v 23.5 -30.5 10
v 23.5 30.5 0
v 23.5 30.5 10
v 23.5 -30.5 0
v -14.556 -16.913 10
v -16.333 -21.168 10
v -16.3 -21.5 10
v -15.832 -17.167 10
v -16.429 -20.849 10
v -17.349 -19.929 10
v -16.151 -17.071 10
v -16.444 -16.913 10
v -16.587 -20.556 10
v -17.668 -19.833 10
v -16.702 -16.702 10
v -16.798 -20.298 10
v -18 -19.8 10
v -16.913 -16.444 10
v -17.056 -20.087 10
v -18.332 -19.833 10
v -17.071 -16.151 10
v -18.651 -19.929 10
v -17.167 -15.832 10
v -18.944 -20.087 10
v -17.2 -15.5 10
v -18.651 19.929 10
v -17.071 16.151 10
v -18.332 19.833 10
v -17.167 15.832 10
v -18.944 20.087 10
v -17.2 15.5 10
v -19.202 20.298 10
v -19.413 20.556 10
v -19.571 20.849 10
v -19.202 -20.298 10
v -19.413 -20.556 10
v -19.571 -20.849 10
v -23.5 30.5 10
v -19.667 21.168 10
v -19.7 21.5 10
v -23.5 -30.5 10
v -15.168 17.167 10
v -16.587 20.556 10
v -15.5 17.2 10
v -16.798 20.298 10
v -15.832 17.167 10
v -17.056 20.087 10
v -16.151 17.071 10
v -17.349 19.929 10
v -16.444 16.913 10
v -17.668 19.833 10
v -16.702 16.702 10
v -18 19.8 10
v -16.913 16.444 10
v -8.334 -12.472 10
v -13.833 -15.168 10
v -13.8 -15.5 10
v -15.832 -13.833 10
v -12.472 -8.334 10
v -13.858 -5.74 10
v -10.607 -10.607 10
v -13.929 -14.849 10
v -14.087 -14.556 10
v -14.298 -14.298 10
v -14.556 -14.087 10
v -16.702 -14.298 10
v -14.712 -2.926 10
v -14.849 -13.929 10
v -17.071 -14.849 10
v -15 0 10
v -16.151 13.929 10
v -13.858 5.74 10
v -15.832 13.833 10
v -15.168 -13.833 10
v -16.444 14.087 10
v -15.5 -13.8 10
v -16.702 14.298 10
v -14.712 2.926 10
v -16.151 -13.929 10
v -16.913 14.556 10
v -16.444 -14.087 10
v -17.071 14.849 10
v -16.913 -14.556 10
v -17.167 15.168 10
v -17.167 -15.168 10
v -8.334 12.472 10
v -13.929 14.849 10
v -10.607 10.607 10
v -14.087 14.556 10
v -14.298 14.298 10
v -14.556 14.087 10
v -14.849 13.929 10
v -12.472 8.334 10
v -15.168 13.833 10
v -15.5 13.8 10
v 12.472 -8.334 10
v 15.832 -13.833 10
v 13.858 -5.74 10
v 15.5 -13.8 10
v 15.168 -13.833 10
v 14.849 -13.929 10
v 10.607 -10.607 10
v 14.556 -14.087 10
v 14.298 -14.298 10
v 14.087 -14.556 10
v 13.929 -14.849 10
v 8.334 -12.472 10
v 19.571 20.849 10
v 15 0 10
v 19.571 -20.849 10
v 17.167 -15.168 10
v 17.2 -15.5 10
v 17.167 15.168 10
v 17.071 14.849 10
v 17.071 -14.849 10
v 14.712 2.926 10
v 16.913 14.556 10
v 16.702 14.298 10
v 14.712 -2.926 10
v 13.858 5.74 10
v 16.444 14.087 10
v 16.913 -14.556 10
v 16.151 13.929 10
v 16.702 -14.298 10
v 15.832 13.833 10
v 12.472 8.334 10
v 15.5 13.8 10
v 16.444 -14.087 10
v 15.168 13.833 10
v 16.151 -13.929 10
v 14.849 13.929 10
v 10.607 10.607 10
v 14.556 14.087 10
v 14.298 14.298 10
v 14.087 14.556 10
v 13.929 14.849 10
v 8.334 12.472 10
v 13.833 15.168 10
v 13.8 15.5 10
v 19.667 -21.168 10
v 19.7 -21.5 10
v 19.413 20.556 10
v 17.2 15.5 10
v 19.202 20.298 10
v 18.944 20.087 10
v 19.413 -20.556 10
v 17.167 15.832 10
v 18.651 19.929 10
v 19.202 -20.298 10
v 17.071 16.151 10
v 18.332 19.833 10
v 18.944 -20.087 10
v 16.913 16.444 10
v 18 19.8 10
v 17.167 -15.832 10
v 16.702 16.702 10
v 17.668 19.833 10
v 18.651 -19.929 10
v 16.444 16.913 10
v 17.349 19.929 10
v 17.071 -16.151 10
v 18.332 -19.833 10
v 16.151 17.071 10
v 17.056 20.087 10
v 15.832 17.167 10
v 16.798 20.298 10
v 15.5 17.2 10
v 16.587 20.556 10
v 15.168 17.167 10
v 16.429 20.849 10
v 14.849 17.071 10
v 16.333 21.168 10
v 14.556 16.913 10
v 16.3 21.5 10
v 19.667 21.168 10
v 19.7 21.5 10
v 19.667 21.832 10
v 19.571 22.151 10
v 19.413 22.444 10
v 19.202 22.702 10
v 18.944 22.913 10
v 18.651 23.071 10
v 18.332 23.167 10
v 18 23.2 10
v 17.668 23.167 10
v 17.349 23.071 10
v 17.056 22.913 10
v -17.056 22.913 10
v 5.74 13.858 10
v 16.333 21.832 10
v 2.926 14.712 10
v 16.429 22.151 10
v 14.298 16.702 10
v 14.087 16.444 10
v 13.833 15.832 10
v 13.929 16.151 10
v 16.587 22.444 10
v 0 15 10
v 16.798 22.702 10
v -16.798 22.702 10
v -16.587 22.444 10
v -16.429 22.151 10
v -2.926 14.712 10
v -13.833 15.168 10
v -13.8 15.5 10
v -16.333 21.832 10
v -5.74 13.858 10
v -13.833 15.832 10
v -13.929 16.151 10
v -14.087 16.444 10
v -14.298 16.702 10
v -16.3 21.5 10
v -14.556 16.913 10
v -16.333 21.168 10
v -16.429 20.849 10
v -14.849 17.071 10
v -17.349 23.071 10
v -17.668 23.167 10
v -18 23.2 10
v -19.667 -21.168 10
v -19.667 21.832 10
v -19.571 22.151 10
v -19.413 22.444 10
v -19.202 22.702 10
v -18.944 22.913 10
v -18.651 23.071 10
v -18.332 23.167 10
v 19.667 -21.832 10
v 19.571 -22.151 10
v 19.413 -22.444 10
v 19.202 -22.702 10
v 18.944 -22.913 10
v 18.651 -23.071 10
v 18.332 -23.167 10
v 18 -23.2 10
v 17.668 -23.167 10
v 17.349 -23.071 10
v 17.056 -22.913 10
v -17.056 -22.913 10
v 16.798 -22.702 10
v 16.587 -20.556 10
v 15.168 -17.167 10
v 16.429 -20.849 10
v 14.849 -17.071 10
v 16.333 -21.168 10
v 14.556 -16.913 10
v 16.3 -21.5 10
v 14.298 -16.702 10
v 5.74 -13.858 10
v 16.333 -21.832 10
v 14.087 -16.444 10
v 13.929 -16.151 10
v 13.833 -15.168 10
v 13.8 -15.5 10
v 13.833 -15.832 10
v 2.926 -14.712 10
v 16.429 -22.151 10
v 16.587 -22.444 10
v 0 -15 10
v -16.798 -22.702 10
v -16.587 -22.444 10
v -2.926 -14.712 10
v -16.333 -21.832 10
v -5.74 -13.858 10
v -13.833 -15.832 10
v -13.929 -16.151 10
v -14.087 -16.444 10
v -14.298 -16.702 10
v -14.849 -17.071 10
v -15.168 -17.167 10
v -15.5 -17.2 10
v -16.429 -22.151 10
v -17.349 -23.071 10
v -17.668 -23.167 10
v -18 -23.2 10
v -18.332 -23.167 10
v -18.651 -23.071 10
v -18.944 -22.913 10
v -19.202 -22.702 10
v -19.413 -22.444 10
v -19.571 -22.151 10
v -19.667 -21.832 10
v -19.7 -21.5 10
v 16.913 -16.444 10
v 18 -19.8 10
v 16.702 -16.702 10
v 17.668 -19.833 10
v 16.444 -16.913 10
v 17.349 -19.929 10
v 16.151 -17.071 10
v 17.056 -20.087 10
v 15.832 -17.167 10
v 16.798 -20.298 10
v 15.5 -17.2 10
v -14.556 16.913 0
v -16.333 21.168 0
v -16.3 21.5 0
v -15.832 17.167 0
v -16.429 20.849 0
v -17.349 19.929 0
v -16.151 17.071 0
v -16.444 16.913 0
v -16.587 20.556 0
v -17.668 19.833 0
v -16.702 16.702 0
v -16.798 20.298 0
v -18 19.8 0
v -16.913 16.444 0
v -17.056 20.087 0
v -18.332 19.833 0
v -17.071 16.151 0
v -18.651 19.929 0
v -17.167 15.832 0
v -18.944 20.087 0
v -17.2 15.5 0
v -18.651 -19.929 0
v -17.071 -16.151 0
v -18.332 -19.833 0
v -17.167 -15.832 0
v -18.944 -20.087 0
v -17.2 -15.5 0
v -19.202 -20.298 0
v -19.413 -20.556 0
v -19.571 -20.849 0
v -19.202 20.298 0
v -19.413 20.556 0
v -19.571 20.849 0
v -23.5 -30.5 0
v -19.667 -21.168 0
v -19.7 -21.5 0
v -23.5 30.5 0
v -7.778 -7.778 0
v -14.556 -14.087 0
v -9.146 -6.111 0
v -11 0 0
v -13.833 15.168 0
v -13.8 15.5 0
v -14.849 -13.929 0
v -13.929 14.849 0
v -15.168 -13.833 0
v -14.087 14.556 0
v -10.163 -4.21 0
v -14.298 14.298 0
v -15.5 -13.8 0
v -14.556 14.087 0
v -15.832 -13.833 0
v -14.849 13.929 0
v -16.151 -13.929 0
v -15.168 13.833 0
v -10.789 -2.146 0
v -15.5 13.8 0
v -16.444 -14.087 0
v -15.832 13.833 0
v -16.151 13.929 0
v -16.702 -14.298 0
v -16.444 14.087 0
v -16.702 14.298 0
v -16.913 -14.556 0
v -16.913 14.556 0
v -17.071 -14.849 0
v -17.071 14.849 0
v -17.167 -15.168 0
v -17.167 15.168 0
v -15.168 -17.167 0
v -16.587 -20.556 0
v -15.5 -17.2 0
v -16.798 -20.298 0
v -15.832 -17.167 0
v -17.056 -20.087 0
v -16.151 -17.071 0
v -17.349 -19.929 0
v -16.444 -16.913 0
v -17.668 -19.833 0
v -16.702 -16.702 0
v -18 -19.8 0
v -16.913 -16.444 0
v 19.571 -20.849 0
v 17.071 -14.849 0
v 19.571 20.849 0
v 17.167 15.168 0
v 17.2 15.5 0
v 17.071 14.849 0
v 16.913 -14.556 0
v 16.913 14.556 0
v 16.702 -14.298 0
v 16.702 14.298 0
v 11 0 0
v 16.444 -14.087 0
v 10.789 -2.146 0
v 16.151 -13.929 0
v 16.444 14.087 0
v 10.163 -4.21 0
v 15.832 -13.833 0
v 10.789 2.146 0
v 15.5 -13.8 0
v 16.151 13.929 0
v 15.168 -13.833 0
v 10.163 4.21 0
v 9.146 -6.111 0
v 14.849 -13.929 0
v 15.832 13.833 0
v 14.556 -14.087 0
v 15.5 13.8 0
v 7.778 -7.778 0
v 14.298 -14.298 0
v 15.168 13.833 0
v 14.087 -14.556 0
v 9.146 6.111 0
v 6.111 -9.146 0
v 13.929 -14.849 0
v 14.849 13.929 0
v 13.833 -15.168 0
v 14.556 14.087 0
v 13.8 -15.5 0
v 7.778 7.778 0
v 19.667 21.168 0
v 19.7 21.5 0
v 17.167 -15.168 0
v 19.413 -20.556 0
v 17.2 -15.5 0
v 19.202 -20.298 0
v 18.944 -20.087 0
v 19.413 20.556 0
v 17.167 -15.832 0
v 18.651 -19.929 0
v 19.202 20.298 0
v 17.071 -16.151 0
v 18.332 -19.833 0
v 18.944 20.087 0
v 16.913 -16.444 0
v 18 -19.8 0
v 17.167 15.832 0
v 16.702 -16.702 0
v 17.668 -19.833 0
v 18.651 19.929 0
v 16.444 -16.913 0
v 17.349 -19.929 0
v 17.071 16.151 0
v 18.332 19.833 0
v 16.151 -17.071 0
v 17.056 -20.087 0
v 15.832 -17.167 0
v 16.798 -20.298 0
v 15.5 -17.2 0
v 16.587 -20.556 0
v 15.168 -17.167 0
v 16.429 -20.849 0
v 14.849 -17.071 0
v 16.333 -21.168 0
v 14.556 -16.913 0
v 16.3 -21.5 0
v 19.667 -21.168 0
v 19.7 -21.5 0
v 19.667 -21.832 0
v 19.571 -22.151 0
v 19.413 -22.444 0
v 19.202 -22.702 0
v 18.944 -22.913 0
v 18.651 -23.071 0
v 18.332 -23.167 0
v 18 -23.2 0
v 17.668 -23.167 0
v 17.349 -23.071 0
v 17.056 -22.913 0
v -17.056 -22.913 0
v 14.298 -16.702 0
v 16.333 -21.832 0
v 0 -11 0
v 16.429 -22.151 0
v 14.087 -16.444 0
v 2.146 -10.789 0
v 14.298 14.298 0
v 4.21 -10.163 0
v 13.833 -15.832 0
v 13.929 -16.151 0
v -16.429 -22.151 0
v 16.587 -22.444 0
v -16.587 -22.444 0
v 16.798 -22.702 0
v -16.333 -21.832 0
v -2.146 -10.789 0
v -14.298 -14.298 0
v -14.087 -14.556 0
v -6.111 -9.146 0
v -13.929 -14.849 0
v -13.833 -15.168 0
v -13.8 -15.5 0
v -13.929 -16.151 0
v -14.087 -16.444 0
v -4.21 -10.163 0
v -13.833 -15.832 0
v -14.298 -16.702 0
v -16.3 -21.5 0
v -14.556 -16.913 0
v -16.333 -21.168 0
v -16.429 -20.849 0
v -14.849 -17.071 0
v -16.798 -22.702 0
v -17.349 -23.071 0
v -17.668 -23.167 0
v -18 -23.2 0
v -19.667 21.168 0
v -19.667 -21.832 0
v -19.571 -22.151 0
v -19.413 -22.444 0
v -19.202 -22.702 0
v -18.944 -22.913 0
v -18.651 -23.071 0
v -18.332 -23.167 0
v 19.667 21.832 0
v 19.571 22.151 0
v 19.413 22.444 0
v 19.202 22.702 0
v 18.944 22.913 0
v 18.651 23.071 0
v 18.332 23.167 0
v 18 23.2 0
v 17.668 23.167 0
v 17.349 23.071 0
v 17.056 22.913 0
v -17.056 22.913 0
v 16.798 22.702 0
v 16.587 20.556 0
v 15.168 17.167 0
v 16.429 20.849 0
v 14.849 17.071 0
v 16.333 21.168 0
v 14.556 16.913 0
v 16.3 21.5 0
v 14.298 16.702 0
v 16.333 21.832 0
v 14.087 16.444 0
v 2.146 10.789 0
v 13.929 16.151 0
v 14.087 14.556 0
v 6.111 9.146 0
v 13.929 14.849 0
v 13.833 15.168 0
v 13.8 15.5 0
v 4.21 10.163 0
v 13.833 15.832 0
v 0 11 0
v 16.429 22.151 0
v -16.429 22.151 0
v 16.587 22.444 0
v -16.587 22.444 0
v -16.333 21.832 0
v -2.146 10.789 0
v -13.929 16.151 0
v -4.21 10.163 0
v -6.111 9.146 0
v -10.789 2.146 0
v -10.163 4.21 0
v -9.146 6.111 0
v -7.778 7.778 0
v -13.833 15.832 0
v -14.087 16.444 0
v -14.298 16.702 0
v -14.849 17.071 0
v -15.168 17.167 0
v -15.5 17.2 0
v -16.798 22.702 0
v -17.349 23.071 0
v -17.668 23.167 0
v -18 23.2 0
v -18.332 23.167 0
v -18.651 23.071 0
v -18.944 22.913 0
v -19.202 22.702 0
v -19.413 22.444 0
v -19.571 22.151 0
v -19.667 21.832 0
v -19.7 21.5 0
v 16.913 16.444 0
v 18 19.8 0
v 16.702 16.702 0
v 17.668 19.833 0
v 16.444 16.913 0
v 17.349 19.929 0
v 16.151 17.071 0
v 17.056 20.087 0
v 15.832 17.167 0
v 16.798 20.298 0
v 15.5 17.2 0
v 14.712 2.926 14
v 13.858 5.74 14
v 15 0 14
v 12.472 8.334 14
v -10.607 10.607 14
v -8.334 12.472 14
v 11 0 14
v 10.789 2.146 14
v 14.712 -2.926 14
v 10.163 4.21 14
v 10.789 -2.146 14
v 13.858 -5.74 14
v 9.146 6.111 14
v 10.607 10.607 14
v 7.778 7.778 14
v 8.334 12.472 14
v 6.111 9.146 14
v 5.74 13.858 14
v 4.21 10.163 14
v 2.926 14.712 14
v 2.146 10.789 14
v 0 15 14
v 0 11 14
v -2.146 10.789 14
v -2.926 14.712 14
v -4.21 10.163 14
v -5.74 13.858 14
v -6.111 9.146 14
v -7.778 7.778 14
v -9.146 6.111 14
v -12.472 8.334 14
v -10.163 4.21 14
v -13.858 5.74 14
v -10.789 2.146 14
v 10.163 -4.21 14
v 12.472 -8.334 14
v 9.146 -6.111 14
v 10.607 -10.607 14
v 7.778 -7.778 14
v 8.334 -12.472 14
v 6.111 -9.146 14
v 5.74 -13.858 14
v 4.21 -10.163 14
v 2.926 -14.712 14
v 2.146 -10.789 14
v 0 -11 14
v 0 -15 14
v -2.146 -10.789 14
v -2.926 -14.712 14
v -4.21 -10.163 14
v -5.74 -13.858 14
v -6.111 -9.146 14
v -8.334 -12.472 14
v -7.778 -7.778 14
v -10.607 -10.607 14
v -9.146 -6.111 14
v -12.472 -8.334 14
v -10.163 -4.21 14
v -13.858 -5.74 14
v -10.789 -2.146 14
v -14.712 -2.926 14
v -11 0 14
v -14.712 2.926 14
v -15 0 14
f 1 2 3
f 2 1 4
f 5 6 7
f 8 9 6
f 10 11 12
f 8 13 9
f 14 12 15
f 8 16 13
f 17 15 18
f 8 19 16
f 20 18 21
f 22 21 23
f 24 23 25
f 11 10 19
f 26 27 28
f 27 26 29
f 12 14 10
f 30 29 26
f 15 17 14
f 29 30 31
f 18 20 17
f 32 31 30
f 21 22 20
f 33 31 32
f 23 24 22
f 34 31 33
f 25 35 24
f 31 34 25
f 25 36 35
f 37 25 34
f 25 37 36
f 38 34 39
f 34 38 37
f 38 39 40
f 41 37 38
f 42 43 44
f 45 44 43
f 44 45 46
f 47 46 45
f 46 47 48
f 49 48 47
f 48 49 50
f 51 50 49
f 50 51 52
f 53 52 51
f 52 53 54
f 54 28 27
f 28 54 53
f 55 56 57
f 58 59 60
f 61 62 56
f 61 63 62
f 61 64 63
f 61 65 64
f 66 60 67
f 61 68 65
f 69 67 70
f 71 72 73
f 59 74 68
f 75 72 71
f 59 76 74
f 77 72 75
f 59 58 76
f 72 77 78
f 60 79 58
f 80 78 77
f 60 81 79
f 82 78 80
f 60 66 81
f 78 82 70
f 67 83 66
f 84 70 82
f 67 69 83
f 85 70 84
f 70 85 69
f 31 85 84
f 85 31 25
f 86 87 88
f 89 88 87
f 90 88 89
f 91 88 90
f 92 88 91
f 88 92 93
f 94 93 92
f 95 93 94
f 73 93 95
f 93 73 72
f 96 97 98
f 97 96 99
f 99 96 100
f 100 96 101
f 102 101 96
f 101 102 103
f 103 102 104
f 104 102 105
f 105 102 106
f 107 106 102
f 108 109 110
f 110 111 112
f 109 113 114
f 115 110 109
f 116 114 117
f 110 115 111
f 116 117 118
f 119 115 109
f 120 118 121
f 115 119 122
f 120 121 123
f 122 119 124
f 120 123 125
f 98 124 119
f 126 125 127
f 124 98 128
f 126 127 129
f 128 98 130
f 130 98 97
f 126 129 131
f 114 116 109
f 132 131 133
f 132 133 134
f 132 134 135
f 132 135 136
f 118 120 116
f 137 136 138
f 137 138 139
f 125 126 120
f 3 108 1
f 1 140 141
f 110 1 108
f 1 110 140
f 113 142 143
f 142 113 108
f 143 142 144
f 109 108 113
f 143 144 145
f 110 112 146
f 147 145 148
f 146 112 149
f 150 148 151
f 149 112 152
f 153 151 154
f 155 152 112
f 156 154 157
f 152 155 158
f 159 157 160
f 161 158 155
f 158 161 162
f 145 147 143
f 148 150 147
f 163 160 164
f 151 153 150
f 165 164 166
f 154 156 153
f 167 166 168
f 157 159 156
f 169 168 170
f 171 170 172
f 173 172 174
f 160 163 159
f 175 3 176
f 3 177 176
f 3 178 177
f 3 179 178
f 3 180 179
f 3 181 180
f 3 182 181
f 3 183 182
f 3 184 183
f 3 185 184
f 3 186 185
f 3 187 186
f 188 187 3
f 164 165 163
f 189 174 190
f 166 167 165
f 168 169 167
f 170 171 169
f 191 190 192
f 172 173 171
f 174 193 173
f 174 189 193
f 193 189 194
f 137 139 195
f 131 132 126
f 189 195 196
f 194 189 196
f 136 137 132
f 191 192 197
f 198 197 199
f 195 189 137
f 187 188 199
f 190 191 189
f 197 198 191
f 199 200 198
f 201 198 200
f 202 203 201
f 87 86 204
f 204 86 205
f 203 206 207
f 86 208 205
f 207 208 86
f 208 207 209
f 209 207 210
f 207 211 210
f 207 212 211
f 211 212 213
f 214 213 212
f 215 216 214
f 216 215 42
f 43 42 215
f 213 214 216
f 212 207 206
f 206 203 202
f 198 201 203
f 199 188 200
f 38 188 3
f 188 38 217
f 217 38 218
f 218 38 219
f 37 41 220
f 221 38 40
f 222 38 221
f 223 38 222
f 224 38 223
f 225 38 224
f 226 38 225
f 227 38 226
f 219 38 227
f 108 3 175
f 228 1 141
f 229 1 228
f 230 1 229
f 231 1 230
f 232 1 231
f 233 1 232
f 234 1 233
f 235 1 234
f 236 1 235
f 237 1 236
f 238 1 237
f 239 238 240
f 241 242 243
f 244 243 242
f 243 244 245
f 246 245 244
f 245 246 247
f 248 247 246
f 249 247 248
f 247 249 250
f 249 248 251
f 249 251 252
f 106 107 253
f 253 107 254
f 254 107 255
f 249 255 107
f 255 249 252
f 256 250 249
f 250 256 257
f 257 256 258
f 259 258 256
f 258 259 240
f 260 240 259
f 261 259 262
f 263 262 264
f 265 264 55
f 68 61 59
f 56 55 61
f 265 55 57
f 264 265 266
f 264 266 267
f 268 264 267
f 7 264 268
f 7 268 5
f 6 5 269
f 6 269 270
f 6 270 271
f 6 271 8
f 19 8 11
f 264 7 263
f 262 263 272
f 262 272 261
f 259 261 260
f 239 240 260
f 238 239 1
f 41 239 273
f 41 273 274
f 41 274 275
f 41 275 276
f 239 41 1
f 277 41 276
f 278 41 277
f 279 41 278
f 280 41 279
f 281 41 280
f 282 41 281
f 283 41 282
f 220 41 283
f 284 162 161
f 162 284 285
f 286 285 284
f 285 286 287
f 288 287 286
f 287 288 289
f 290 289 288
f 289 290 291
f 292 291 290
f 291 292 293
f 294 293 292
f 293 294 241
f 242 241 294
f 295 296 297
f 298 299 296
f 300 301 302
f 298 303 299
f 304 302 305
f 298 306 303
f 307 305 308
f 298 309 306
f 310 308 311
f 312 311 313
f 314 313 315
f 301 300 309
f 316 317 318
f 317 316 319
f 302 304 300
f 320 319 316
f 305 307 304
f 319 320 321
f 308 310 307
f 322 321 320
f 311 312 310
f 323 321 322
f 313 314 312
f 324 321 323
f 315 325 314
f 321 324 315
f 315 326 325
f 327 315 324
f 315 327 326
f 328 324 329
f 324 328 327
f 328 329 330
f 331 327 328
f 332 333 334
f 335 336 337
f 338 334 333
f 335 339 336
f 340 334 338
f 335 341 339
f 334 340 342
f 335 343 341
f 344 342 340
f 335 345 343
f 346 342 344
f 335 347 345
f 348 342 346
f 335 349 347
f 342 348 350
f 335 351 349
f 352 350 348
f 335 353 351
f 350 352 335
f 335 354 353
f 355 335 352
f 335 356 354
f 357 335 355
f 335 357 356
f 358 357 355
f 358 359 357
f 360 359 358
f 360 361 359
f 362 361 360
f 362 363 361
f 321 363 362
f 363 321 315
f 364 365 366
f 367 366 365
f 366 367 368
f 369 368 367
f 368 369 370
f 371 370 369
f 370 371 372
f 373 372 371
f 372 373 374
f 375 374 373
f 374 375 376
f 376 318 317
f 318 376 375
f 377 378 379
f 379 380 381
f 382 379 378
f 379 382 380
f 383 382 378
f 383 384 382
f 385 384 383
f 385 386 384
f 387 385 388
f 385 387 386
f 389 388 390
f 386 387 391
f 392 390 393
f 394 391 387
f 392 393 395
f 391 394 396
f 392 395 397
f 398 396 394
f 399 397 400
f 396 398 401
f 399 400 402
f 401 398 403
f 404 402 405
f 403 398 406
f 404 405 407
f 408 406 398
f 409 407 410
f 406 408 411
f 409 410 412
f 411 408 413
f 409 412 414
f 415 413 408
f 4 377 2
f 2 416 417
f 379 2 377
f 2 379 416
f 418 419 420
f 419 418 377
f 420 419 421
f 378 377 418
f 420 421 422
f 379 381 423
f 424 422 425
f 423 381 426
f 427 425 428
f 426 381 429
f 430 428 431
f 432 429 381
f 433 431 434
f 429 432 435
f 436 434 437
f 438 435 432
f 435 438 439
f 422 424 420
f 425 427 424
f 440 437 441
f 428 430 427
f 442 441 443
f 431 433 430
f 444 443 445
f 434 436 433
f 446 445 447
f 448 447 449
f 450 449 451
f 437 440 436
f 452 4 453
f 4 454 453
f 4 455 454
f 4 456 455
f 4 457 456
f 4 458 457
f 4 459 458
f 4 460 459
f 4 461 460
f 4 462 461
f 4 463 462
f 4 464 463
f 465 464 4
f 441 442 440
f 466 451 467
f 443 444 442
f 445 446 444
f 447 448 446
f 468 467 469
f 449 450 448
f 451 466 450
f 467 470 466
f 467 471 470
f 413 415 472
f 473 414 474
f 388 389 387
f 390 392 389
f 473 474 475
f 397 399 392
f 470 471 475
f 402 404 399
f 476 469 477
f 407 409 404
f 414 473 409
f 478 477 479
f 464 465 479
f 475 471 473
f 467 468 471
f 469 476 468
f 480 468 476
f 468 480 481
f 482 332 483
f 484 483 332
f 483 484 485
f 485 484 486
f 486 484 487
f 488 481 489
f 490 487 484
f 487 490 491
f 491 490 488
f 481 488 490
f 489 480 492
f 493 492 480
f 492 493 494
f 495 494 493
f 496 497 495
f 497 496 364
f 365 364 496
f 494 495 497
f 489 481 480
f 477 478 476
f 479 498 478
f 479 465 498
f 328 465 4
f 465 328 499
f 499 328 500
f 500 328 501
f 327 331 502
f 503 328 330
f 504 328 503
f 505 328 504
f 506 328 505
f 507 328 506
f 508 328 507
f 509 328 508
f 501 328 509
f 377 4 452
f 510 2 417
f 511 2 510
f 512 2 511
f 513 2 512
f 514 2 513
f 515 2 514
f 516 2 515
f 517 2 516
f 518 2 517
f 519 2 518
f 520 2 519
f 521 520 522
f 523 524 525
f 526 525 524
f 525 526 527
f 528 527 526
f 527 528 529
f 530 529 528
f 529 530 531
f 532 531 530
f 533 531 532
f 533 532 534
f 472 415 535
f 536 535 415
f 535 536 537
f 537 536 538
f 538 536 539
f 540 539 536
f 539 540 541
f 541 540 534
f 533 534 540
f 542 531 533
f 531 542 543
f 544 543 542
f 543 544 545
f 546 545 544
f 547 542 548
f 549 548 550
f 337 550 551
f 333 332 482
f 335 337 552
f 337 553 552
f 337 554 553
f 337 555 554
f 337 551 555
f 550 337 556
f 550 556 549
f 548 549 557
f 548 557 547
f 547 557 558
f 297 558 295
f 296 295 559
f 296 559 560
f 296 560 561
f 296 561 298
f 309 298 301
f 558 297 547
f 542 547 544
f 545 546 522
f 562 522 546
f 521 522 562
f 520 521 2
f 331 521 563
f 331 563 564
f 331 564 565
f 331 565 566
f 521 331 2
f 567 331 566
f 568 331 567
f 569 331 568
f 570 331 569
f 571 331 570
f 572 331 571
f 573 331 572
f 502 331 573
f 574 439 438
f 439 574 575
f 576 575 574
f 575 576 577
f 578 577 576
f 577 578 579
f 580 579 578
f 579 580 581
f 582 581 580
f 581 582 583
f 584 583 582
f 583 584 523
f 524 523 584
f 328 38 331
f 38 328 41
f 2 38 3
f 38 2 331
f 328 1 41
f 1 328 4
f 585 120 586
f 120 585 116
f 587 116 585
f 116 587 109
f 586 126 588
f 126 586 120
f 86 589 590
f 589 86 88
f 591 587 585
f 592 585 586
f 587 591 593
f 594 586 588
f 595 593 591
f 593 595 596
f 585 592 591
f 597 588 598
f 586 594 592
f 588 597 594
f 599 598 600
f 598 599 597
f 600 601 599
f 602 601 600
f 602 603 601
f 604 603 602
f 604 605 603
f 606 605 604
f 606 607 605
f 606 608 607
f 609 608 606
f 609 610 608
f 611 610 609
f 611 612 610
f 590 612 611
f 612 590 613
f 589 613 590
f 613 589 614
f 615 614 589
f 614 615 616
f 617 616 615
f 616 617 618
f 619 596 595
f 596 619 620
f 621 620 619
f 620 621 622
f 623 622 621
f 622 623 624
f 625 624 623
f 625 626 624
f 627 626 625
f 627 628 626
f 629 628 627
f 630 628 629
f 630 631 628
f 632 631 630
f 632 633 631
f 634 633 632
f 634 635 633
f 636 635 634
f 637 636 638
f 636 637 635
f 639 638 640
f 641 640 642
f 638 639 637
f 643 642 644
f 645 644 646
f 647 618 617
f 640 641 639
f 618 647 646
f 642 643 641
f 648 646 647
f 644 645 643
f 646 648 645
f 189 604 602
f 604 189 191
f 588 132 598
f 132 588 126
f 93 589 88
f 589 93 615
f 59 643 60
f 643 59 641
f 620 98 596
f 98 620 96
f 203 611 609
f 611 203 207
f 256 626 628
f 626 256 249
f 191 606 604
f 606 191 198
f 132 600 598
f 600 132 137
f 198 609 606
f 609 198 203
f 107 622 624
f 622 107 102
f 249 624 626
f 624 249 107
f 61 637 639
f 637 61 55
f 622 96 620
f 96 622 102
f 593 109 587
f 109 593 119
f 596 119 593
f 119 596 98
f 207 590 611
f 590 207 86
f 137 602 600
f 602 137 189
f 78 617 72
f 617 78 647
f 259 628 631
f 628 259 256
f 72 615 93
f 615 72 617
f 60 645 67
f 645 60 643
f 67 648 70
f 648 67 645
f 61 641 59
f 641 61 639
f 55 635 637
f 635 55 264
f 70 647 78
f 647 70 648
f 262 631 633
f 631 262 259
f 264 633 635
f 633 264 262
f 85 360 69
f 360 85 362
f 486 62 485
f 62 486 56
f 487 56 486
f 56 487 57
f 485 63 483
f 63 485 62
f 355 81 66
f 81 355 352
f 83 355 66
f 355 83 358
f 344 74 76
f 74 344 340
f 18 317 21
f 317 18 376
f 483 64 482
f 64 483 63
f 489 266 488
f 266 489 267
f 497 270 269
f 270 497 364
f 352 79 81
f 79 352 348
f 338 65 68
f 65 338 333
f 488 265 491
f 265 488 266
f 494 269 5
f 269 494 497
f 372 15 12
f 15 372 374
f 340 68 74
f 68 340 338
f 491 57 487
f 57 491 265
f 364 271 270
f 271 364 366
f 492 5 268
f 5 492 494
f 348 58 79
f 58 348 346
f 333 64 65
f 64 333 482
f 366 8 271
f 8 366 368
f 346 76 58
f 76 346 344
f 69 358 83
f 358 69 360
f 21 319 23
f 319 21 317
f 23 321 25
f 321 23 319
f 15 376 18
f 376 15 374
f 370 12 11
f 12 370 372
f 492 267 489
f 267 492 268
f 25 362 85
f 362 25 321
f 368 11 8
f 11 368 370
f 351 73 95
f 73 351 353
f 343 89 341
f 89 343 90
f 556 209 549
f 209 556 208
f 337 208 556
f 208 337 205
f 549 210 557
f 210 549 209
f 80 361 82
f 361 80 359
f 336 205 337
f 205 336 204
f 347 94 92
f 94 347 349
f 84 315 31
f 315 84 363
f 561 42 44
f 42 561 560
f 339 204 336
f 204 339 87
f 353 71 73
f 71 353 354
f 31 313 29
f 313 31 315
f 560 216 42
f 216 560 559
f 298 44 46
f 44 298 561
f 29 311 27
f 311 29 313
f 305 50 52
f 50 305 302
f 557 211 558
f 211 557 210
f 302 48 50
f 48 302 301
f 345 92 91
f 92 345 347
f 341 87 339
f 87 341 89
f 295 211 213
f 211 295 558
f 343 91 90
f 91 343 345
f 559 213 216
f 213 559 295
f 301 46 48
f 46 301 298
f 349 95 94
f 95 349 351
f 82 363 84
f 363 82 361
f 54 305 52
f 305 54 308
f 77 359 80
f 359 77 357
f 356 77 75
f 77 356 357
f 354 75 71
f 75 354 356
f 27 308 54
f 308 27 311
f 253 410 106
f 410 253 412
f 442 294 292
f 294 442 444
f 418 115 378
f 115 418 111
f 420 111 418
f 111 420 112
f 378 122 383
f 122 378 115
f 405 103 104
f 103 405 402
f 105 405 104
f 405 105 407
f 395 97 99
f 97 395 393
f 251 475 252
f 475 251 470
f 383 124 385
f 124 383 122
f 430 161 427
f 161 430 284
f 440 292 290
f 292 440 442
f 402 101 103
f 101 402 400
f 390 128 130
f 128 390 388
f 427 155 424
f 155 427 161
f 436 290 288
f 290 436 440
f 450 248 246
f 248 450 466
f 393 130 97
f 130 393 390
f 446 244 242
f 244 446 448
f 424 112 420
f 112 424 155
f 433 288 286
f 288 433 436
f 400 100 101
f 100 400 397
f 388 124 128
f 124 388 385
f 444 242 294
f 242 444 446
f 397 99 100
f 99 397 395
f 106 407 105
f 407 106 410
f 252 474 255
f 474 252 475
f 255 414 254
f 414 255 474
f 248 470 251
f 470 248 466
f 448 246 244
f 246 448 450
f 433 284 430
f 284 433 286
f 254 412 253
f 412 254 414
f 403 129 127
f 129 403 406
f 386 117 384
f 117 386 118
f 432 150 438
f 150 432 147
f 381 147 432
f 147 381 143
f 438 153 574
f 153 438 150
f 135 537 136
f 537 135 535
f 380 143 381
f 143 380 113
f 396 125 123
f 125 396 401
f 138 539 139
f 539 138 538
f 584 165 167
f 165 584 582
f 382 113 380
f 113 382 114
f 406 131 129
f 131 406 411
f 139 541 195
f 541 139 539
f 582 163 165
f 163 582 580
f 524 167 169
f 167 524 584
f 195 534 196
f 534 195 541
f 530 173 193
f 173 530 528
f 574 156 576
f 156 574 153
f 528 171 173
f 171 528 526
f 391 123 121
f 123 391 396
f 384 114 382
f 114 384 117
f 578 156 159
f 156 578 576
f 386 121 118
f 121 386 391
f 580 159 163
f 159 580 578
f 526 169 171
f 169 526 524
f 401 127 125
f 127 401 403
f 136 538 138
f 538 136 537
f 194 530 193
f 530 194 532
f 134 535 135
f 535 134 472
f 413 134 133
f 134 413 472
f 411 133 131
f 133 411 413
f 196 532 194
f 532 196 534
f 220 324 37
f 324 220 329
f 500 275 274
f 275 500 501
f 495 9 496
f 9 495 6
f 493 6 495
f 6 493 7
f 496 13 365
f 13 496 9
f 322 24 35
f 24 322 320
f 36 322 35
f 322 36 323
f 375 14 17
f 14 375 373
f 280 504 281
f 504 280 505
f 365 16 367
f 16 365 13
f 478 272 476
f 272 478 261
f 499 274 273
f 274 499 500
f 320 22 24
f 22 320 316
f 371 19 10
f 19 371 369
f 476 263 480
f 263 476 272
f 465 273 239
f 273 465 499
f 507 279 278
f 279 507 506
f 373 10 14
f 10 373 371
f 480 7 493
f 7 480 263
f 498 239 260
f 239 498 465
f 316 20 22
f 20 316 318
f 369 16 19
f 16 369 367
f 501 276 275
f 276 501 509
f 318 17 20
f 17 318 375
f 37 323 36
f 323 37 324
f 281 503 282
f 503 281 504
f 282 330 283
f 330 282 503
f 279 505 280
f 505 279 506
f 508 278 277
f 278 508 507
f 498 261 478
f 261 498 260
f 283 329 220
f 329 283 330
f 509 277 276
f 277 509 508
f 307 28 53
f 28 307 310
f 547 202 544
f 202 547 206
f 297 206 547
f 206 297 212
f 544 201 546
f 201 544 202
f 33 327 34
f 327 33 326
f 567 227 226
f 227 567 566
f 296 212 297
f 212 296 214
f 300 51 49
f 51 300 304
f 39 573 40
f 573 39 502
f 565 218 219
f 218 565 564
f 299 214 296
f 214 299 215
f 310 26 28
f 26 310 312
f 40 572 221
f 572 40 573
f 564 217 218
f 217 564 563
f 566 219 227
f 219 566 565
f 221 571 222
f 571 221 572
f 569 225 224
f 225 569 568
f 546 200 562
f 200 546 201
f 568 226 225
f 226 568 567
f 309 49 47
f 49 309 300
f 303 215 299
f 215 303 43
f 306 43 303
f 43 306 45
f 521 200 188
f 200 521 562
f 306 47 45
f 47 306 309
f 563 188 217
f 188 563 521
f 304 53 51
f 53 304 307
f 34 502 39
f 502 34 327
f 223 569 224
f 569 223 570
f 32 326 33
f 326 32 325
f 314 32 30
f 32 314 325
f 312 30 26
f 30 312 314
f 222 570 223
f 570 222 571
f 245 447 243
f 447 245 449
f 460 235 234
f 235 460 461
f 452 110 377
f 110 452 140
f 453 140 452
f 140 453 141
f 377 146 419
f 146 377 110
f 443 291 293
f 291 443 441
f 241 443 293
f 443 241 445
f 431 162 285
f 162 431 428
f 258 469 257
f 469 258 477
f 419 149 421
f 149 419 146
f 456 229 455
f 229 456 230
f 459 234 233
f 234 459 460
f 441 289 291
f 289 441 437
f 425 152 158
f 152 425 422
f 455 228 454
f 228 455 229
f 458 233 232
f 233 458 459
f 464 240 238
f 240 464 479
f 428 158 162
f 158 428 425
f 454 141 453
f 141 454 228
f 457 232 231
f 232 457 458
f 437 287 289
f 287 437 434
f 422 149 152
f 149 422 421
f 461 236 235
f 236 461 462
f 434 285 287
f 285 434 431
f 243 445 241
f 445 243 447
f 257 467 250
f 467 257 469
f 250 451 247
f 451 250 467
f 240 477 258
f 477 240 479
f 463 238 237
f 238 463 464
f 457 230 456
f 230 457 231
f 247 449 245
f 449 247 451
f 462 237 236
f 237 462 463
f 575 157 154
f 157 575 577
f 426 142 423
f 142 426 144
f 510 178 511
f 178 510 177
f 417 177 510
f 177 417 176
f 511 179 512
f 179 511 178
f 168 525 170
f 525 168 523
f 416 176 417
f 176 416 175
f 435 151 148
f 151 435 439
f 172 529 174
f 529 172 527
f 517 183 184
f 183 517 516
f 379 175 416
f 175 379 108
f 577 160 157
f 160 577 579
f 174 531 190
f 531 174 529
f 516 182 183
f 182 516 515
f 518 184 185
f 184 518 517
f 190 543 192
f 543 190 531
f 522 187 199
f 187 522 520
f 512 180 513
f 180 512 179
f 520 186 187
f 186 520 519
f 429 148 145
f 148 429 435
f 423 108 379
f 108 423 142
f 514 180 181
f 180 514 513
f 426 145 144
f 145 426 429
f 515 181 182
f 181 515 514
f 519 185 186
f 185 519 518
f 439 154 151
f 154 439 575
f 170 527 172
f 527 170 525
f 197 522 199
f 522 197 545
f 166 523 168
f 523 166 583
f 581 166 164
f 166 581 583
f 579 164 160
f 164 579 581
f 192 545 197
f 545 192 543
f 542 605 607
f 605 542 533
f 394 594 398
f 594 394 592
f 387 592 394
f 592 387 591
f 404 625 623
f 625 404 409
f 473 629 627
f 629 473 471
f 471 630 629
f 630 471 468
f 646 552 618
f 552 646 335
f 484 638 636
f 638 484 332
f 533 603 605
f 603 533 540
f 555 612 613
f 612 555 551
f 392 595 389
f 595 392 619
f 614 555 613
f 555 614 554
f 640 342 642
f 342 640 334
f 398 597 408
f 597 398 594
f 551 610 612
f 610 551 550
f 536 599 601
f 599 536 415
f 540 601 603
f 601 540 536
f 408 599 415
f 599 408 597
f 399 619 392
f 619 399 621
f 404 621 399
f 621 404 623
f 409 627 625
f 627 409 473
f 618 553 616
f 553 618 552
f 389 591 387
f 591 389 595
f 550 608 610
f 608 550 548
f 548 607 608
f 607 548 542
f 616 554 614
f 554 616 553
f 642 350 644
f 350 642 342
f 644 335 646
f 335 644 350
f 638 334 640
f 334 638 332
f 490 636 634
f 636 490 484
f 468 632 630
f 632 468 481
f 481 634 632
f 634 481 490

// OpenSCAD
$fn = 32;

// ----------------------------------------------------------------------
// Motor mount plate: NEMA17, 47 x 61 x 14 mm
// ----------------------------------------------------------------------

// --- parameters (mm) ---
mount_w = 47;             // plate length, X
mount_d = 61;             // plate width, Y
mat_t = 10;               // plate thickness
motor_pitch = 31;         // NEMA17 bolt spacing
motor_d = 3.4;            // NEMA17 screw clearance
center_bore = 22;         // pilot boss bore
boss_d = 30;              // raised pilot ring
boss_h = 4;               // raised pilot ring height
second_d = 3.4;           // second fastener hole

module plate() {
  translate([-mount_w / 2, -mount_d / 2, 0]) cube([mount_w, mount_d, mat_t]);
}

module motor_holes() {
  for (sx = [-1, 1]) for (sy = [-1, 1])
    translate([sx * motor_pitch / 2, sy * motor_pitch / 2, -1])
      cylinder(h = mat_t + 2, d = motor_d);
}
module pilot_ring() {
  translate([0, 0, mat_t - 1]) cylinder(h = boss_h + 1, d = boss_d);
}

difference() {
  union() {
    plate();
    pilot_ring();
  }
  motor_holes();
  translate([0, 0, -1]) cylinder(h = mat_t + boss_h + 2, d = center_bore);
  for (sx = [-1, 1]) for (sy = [-1, 1])
    translate([sx * 18, sy * 21.5, -1]) cylinder(h = mat_t + 2, d = second_d);
}
